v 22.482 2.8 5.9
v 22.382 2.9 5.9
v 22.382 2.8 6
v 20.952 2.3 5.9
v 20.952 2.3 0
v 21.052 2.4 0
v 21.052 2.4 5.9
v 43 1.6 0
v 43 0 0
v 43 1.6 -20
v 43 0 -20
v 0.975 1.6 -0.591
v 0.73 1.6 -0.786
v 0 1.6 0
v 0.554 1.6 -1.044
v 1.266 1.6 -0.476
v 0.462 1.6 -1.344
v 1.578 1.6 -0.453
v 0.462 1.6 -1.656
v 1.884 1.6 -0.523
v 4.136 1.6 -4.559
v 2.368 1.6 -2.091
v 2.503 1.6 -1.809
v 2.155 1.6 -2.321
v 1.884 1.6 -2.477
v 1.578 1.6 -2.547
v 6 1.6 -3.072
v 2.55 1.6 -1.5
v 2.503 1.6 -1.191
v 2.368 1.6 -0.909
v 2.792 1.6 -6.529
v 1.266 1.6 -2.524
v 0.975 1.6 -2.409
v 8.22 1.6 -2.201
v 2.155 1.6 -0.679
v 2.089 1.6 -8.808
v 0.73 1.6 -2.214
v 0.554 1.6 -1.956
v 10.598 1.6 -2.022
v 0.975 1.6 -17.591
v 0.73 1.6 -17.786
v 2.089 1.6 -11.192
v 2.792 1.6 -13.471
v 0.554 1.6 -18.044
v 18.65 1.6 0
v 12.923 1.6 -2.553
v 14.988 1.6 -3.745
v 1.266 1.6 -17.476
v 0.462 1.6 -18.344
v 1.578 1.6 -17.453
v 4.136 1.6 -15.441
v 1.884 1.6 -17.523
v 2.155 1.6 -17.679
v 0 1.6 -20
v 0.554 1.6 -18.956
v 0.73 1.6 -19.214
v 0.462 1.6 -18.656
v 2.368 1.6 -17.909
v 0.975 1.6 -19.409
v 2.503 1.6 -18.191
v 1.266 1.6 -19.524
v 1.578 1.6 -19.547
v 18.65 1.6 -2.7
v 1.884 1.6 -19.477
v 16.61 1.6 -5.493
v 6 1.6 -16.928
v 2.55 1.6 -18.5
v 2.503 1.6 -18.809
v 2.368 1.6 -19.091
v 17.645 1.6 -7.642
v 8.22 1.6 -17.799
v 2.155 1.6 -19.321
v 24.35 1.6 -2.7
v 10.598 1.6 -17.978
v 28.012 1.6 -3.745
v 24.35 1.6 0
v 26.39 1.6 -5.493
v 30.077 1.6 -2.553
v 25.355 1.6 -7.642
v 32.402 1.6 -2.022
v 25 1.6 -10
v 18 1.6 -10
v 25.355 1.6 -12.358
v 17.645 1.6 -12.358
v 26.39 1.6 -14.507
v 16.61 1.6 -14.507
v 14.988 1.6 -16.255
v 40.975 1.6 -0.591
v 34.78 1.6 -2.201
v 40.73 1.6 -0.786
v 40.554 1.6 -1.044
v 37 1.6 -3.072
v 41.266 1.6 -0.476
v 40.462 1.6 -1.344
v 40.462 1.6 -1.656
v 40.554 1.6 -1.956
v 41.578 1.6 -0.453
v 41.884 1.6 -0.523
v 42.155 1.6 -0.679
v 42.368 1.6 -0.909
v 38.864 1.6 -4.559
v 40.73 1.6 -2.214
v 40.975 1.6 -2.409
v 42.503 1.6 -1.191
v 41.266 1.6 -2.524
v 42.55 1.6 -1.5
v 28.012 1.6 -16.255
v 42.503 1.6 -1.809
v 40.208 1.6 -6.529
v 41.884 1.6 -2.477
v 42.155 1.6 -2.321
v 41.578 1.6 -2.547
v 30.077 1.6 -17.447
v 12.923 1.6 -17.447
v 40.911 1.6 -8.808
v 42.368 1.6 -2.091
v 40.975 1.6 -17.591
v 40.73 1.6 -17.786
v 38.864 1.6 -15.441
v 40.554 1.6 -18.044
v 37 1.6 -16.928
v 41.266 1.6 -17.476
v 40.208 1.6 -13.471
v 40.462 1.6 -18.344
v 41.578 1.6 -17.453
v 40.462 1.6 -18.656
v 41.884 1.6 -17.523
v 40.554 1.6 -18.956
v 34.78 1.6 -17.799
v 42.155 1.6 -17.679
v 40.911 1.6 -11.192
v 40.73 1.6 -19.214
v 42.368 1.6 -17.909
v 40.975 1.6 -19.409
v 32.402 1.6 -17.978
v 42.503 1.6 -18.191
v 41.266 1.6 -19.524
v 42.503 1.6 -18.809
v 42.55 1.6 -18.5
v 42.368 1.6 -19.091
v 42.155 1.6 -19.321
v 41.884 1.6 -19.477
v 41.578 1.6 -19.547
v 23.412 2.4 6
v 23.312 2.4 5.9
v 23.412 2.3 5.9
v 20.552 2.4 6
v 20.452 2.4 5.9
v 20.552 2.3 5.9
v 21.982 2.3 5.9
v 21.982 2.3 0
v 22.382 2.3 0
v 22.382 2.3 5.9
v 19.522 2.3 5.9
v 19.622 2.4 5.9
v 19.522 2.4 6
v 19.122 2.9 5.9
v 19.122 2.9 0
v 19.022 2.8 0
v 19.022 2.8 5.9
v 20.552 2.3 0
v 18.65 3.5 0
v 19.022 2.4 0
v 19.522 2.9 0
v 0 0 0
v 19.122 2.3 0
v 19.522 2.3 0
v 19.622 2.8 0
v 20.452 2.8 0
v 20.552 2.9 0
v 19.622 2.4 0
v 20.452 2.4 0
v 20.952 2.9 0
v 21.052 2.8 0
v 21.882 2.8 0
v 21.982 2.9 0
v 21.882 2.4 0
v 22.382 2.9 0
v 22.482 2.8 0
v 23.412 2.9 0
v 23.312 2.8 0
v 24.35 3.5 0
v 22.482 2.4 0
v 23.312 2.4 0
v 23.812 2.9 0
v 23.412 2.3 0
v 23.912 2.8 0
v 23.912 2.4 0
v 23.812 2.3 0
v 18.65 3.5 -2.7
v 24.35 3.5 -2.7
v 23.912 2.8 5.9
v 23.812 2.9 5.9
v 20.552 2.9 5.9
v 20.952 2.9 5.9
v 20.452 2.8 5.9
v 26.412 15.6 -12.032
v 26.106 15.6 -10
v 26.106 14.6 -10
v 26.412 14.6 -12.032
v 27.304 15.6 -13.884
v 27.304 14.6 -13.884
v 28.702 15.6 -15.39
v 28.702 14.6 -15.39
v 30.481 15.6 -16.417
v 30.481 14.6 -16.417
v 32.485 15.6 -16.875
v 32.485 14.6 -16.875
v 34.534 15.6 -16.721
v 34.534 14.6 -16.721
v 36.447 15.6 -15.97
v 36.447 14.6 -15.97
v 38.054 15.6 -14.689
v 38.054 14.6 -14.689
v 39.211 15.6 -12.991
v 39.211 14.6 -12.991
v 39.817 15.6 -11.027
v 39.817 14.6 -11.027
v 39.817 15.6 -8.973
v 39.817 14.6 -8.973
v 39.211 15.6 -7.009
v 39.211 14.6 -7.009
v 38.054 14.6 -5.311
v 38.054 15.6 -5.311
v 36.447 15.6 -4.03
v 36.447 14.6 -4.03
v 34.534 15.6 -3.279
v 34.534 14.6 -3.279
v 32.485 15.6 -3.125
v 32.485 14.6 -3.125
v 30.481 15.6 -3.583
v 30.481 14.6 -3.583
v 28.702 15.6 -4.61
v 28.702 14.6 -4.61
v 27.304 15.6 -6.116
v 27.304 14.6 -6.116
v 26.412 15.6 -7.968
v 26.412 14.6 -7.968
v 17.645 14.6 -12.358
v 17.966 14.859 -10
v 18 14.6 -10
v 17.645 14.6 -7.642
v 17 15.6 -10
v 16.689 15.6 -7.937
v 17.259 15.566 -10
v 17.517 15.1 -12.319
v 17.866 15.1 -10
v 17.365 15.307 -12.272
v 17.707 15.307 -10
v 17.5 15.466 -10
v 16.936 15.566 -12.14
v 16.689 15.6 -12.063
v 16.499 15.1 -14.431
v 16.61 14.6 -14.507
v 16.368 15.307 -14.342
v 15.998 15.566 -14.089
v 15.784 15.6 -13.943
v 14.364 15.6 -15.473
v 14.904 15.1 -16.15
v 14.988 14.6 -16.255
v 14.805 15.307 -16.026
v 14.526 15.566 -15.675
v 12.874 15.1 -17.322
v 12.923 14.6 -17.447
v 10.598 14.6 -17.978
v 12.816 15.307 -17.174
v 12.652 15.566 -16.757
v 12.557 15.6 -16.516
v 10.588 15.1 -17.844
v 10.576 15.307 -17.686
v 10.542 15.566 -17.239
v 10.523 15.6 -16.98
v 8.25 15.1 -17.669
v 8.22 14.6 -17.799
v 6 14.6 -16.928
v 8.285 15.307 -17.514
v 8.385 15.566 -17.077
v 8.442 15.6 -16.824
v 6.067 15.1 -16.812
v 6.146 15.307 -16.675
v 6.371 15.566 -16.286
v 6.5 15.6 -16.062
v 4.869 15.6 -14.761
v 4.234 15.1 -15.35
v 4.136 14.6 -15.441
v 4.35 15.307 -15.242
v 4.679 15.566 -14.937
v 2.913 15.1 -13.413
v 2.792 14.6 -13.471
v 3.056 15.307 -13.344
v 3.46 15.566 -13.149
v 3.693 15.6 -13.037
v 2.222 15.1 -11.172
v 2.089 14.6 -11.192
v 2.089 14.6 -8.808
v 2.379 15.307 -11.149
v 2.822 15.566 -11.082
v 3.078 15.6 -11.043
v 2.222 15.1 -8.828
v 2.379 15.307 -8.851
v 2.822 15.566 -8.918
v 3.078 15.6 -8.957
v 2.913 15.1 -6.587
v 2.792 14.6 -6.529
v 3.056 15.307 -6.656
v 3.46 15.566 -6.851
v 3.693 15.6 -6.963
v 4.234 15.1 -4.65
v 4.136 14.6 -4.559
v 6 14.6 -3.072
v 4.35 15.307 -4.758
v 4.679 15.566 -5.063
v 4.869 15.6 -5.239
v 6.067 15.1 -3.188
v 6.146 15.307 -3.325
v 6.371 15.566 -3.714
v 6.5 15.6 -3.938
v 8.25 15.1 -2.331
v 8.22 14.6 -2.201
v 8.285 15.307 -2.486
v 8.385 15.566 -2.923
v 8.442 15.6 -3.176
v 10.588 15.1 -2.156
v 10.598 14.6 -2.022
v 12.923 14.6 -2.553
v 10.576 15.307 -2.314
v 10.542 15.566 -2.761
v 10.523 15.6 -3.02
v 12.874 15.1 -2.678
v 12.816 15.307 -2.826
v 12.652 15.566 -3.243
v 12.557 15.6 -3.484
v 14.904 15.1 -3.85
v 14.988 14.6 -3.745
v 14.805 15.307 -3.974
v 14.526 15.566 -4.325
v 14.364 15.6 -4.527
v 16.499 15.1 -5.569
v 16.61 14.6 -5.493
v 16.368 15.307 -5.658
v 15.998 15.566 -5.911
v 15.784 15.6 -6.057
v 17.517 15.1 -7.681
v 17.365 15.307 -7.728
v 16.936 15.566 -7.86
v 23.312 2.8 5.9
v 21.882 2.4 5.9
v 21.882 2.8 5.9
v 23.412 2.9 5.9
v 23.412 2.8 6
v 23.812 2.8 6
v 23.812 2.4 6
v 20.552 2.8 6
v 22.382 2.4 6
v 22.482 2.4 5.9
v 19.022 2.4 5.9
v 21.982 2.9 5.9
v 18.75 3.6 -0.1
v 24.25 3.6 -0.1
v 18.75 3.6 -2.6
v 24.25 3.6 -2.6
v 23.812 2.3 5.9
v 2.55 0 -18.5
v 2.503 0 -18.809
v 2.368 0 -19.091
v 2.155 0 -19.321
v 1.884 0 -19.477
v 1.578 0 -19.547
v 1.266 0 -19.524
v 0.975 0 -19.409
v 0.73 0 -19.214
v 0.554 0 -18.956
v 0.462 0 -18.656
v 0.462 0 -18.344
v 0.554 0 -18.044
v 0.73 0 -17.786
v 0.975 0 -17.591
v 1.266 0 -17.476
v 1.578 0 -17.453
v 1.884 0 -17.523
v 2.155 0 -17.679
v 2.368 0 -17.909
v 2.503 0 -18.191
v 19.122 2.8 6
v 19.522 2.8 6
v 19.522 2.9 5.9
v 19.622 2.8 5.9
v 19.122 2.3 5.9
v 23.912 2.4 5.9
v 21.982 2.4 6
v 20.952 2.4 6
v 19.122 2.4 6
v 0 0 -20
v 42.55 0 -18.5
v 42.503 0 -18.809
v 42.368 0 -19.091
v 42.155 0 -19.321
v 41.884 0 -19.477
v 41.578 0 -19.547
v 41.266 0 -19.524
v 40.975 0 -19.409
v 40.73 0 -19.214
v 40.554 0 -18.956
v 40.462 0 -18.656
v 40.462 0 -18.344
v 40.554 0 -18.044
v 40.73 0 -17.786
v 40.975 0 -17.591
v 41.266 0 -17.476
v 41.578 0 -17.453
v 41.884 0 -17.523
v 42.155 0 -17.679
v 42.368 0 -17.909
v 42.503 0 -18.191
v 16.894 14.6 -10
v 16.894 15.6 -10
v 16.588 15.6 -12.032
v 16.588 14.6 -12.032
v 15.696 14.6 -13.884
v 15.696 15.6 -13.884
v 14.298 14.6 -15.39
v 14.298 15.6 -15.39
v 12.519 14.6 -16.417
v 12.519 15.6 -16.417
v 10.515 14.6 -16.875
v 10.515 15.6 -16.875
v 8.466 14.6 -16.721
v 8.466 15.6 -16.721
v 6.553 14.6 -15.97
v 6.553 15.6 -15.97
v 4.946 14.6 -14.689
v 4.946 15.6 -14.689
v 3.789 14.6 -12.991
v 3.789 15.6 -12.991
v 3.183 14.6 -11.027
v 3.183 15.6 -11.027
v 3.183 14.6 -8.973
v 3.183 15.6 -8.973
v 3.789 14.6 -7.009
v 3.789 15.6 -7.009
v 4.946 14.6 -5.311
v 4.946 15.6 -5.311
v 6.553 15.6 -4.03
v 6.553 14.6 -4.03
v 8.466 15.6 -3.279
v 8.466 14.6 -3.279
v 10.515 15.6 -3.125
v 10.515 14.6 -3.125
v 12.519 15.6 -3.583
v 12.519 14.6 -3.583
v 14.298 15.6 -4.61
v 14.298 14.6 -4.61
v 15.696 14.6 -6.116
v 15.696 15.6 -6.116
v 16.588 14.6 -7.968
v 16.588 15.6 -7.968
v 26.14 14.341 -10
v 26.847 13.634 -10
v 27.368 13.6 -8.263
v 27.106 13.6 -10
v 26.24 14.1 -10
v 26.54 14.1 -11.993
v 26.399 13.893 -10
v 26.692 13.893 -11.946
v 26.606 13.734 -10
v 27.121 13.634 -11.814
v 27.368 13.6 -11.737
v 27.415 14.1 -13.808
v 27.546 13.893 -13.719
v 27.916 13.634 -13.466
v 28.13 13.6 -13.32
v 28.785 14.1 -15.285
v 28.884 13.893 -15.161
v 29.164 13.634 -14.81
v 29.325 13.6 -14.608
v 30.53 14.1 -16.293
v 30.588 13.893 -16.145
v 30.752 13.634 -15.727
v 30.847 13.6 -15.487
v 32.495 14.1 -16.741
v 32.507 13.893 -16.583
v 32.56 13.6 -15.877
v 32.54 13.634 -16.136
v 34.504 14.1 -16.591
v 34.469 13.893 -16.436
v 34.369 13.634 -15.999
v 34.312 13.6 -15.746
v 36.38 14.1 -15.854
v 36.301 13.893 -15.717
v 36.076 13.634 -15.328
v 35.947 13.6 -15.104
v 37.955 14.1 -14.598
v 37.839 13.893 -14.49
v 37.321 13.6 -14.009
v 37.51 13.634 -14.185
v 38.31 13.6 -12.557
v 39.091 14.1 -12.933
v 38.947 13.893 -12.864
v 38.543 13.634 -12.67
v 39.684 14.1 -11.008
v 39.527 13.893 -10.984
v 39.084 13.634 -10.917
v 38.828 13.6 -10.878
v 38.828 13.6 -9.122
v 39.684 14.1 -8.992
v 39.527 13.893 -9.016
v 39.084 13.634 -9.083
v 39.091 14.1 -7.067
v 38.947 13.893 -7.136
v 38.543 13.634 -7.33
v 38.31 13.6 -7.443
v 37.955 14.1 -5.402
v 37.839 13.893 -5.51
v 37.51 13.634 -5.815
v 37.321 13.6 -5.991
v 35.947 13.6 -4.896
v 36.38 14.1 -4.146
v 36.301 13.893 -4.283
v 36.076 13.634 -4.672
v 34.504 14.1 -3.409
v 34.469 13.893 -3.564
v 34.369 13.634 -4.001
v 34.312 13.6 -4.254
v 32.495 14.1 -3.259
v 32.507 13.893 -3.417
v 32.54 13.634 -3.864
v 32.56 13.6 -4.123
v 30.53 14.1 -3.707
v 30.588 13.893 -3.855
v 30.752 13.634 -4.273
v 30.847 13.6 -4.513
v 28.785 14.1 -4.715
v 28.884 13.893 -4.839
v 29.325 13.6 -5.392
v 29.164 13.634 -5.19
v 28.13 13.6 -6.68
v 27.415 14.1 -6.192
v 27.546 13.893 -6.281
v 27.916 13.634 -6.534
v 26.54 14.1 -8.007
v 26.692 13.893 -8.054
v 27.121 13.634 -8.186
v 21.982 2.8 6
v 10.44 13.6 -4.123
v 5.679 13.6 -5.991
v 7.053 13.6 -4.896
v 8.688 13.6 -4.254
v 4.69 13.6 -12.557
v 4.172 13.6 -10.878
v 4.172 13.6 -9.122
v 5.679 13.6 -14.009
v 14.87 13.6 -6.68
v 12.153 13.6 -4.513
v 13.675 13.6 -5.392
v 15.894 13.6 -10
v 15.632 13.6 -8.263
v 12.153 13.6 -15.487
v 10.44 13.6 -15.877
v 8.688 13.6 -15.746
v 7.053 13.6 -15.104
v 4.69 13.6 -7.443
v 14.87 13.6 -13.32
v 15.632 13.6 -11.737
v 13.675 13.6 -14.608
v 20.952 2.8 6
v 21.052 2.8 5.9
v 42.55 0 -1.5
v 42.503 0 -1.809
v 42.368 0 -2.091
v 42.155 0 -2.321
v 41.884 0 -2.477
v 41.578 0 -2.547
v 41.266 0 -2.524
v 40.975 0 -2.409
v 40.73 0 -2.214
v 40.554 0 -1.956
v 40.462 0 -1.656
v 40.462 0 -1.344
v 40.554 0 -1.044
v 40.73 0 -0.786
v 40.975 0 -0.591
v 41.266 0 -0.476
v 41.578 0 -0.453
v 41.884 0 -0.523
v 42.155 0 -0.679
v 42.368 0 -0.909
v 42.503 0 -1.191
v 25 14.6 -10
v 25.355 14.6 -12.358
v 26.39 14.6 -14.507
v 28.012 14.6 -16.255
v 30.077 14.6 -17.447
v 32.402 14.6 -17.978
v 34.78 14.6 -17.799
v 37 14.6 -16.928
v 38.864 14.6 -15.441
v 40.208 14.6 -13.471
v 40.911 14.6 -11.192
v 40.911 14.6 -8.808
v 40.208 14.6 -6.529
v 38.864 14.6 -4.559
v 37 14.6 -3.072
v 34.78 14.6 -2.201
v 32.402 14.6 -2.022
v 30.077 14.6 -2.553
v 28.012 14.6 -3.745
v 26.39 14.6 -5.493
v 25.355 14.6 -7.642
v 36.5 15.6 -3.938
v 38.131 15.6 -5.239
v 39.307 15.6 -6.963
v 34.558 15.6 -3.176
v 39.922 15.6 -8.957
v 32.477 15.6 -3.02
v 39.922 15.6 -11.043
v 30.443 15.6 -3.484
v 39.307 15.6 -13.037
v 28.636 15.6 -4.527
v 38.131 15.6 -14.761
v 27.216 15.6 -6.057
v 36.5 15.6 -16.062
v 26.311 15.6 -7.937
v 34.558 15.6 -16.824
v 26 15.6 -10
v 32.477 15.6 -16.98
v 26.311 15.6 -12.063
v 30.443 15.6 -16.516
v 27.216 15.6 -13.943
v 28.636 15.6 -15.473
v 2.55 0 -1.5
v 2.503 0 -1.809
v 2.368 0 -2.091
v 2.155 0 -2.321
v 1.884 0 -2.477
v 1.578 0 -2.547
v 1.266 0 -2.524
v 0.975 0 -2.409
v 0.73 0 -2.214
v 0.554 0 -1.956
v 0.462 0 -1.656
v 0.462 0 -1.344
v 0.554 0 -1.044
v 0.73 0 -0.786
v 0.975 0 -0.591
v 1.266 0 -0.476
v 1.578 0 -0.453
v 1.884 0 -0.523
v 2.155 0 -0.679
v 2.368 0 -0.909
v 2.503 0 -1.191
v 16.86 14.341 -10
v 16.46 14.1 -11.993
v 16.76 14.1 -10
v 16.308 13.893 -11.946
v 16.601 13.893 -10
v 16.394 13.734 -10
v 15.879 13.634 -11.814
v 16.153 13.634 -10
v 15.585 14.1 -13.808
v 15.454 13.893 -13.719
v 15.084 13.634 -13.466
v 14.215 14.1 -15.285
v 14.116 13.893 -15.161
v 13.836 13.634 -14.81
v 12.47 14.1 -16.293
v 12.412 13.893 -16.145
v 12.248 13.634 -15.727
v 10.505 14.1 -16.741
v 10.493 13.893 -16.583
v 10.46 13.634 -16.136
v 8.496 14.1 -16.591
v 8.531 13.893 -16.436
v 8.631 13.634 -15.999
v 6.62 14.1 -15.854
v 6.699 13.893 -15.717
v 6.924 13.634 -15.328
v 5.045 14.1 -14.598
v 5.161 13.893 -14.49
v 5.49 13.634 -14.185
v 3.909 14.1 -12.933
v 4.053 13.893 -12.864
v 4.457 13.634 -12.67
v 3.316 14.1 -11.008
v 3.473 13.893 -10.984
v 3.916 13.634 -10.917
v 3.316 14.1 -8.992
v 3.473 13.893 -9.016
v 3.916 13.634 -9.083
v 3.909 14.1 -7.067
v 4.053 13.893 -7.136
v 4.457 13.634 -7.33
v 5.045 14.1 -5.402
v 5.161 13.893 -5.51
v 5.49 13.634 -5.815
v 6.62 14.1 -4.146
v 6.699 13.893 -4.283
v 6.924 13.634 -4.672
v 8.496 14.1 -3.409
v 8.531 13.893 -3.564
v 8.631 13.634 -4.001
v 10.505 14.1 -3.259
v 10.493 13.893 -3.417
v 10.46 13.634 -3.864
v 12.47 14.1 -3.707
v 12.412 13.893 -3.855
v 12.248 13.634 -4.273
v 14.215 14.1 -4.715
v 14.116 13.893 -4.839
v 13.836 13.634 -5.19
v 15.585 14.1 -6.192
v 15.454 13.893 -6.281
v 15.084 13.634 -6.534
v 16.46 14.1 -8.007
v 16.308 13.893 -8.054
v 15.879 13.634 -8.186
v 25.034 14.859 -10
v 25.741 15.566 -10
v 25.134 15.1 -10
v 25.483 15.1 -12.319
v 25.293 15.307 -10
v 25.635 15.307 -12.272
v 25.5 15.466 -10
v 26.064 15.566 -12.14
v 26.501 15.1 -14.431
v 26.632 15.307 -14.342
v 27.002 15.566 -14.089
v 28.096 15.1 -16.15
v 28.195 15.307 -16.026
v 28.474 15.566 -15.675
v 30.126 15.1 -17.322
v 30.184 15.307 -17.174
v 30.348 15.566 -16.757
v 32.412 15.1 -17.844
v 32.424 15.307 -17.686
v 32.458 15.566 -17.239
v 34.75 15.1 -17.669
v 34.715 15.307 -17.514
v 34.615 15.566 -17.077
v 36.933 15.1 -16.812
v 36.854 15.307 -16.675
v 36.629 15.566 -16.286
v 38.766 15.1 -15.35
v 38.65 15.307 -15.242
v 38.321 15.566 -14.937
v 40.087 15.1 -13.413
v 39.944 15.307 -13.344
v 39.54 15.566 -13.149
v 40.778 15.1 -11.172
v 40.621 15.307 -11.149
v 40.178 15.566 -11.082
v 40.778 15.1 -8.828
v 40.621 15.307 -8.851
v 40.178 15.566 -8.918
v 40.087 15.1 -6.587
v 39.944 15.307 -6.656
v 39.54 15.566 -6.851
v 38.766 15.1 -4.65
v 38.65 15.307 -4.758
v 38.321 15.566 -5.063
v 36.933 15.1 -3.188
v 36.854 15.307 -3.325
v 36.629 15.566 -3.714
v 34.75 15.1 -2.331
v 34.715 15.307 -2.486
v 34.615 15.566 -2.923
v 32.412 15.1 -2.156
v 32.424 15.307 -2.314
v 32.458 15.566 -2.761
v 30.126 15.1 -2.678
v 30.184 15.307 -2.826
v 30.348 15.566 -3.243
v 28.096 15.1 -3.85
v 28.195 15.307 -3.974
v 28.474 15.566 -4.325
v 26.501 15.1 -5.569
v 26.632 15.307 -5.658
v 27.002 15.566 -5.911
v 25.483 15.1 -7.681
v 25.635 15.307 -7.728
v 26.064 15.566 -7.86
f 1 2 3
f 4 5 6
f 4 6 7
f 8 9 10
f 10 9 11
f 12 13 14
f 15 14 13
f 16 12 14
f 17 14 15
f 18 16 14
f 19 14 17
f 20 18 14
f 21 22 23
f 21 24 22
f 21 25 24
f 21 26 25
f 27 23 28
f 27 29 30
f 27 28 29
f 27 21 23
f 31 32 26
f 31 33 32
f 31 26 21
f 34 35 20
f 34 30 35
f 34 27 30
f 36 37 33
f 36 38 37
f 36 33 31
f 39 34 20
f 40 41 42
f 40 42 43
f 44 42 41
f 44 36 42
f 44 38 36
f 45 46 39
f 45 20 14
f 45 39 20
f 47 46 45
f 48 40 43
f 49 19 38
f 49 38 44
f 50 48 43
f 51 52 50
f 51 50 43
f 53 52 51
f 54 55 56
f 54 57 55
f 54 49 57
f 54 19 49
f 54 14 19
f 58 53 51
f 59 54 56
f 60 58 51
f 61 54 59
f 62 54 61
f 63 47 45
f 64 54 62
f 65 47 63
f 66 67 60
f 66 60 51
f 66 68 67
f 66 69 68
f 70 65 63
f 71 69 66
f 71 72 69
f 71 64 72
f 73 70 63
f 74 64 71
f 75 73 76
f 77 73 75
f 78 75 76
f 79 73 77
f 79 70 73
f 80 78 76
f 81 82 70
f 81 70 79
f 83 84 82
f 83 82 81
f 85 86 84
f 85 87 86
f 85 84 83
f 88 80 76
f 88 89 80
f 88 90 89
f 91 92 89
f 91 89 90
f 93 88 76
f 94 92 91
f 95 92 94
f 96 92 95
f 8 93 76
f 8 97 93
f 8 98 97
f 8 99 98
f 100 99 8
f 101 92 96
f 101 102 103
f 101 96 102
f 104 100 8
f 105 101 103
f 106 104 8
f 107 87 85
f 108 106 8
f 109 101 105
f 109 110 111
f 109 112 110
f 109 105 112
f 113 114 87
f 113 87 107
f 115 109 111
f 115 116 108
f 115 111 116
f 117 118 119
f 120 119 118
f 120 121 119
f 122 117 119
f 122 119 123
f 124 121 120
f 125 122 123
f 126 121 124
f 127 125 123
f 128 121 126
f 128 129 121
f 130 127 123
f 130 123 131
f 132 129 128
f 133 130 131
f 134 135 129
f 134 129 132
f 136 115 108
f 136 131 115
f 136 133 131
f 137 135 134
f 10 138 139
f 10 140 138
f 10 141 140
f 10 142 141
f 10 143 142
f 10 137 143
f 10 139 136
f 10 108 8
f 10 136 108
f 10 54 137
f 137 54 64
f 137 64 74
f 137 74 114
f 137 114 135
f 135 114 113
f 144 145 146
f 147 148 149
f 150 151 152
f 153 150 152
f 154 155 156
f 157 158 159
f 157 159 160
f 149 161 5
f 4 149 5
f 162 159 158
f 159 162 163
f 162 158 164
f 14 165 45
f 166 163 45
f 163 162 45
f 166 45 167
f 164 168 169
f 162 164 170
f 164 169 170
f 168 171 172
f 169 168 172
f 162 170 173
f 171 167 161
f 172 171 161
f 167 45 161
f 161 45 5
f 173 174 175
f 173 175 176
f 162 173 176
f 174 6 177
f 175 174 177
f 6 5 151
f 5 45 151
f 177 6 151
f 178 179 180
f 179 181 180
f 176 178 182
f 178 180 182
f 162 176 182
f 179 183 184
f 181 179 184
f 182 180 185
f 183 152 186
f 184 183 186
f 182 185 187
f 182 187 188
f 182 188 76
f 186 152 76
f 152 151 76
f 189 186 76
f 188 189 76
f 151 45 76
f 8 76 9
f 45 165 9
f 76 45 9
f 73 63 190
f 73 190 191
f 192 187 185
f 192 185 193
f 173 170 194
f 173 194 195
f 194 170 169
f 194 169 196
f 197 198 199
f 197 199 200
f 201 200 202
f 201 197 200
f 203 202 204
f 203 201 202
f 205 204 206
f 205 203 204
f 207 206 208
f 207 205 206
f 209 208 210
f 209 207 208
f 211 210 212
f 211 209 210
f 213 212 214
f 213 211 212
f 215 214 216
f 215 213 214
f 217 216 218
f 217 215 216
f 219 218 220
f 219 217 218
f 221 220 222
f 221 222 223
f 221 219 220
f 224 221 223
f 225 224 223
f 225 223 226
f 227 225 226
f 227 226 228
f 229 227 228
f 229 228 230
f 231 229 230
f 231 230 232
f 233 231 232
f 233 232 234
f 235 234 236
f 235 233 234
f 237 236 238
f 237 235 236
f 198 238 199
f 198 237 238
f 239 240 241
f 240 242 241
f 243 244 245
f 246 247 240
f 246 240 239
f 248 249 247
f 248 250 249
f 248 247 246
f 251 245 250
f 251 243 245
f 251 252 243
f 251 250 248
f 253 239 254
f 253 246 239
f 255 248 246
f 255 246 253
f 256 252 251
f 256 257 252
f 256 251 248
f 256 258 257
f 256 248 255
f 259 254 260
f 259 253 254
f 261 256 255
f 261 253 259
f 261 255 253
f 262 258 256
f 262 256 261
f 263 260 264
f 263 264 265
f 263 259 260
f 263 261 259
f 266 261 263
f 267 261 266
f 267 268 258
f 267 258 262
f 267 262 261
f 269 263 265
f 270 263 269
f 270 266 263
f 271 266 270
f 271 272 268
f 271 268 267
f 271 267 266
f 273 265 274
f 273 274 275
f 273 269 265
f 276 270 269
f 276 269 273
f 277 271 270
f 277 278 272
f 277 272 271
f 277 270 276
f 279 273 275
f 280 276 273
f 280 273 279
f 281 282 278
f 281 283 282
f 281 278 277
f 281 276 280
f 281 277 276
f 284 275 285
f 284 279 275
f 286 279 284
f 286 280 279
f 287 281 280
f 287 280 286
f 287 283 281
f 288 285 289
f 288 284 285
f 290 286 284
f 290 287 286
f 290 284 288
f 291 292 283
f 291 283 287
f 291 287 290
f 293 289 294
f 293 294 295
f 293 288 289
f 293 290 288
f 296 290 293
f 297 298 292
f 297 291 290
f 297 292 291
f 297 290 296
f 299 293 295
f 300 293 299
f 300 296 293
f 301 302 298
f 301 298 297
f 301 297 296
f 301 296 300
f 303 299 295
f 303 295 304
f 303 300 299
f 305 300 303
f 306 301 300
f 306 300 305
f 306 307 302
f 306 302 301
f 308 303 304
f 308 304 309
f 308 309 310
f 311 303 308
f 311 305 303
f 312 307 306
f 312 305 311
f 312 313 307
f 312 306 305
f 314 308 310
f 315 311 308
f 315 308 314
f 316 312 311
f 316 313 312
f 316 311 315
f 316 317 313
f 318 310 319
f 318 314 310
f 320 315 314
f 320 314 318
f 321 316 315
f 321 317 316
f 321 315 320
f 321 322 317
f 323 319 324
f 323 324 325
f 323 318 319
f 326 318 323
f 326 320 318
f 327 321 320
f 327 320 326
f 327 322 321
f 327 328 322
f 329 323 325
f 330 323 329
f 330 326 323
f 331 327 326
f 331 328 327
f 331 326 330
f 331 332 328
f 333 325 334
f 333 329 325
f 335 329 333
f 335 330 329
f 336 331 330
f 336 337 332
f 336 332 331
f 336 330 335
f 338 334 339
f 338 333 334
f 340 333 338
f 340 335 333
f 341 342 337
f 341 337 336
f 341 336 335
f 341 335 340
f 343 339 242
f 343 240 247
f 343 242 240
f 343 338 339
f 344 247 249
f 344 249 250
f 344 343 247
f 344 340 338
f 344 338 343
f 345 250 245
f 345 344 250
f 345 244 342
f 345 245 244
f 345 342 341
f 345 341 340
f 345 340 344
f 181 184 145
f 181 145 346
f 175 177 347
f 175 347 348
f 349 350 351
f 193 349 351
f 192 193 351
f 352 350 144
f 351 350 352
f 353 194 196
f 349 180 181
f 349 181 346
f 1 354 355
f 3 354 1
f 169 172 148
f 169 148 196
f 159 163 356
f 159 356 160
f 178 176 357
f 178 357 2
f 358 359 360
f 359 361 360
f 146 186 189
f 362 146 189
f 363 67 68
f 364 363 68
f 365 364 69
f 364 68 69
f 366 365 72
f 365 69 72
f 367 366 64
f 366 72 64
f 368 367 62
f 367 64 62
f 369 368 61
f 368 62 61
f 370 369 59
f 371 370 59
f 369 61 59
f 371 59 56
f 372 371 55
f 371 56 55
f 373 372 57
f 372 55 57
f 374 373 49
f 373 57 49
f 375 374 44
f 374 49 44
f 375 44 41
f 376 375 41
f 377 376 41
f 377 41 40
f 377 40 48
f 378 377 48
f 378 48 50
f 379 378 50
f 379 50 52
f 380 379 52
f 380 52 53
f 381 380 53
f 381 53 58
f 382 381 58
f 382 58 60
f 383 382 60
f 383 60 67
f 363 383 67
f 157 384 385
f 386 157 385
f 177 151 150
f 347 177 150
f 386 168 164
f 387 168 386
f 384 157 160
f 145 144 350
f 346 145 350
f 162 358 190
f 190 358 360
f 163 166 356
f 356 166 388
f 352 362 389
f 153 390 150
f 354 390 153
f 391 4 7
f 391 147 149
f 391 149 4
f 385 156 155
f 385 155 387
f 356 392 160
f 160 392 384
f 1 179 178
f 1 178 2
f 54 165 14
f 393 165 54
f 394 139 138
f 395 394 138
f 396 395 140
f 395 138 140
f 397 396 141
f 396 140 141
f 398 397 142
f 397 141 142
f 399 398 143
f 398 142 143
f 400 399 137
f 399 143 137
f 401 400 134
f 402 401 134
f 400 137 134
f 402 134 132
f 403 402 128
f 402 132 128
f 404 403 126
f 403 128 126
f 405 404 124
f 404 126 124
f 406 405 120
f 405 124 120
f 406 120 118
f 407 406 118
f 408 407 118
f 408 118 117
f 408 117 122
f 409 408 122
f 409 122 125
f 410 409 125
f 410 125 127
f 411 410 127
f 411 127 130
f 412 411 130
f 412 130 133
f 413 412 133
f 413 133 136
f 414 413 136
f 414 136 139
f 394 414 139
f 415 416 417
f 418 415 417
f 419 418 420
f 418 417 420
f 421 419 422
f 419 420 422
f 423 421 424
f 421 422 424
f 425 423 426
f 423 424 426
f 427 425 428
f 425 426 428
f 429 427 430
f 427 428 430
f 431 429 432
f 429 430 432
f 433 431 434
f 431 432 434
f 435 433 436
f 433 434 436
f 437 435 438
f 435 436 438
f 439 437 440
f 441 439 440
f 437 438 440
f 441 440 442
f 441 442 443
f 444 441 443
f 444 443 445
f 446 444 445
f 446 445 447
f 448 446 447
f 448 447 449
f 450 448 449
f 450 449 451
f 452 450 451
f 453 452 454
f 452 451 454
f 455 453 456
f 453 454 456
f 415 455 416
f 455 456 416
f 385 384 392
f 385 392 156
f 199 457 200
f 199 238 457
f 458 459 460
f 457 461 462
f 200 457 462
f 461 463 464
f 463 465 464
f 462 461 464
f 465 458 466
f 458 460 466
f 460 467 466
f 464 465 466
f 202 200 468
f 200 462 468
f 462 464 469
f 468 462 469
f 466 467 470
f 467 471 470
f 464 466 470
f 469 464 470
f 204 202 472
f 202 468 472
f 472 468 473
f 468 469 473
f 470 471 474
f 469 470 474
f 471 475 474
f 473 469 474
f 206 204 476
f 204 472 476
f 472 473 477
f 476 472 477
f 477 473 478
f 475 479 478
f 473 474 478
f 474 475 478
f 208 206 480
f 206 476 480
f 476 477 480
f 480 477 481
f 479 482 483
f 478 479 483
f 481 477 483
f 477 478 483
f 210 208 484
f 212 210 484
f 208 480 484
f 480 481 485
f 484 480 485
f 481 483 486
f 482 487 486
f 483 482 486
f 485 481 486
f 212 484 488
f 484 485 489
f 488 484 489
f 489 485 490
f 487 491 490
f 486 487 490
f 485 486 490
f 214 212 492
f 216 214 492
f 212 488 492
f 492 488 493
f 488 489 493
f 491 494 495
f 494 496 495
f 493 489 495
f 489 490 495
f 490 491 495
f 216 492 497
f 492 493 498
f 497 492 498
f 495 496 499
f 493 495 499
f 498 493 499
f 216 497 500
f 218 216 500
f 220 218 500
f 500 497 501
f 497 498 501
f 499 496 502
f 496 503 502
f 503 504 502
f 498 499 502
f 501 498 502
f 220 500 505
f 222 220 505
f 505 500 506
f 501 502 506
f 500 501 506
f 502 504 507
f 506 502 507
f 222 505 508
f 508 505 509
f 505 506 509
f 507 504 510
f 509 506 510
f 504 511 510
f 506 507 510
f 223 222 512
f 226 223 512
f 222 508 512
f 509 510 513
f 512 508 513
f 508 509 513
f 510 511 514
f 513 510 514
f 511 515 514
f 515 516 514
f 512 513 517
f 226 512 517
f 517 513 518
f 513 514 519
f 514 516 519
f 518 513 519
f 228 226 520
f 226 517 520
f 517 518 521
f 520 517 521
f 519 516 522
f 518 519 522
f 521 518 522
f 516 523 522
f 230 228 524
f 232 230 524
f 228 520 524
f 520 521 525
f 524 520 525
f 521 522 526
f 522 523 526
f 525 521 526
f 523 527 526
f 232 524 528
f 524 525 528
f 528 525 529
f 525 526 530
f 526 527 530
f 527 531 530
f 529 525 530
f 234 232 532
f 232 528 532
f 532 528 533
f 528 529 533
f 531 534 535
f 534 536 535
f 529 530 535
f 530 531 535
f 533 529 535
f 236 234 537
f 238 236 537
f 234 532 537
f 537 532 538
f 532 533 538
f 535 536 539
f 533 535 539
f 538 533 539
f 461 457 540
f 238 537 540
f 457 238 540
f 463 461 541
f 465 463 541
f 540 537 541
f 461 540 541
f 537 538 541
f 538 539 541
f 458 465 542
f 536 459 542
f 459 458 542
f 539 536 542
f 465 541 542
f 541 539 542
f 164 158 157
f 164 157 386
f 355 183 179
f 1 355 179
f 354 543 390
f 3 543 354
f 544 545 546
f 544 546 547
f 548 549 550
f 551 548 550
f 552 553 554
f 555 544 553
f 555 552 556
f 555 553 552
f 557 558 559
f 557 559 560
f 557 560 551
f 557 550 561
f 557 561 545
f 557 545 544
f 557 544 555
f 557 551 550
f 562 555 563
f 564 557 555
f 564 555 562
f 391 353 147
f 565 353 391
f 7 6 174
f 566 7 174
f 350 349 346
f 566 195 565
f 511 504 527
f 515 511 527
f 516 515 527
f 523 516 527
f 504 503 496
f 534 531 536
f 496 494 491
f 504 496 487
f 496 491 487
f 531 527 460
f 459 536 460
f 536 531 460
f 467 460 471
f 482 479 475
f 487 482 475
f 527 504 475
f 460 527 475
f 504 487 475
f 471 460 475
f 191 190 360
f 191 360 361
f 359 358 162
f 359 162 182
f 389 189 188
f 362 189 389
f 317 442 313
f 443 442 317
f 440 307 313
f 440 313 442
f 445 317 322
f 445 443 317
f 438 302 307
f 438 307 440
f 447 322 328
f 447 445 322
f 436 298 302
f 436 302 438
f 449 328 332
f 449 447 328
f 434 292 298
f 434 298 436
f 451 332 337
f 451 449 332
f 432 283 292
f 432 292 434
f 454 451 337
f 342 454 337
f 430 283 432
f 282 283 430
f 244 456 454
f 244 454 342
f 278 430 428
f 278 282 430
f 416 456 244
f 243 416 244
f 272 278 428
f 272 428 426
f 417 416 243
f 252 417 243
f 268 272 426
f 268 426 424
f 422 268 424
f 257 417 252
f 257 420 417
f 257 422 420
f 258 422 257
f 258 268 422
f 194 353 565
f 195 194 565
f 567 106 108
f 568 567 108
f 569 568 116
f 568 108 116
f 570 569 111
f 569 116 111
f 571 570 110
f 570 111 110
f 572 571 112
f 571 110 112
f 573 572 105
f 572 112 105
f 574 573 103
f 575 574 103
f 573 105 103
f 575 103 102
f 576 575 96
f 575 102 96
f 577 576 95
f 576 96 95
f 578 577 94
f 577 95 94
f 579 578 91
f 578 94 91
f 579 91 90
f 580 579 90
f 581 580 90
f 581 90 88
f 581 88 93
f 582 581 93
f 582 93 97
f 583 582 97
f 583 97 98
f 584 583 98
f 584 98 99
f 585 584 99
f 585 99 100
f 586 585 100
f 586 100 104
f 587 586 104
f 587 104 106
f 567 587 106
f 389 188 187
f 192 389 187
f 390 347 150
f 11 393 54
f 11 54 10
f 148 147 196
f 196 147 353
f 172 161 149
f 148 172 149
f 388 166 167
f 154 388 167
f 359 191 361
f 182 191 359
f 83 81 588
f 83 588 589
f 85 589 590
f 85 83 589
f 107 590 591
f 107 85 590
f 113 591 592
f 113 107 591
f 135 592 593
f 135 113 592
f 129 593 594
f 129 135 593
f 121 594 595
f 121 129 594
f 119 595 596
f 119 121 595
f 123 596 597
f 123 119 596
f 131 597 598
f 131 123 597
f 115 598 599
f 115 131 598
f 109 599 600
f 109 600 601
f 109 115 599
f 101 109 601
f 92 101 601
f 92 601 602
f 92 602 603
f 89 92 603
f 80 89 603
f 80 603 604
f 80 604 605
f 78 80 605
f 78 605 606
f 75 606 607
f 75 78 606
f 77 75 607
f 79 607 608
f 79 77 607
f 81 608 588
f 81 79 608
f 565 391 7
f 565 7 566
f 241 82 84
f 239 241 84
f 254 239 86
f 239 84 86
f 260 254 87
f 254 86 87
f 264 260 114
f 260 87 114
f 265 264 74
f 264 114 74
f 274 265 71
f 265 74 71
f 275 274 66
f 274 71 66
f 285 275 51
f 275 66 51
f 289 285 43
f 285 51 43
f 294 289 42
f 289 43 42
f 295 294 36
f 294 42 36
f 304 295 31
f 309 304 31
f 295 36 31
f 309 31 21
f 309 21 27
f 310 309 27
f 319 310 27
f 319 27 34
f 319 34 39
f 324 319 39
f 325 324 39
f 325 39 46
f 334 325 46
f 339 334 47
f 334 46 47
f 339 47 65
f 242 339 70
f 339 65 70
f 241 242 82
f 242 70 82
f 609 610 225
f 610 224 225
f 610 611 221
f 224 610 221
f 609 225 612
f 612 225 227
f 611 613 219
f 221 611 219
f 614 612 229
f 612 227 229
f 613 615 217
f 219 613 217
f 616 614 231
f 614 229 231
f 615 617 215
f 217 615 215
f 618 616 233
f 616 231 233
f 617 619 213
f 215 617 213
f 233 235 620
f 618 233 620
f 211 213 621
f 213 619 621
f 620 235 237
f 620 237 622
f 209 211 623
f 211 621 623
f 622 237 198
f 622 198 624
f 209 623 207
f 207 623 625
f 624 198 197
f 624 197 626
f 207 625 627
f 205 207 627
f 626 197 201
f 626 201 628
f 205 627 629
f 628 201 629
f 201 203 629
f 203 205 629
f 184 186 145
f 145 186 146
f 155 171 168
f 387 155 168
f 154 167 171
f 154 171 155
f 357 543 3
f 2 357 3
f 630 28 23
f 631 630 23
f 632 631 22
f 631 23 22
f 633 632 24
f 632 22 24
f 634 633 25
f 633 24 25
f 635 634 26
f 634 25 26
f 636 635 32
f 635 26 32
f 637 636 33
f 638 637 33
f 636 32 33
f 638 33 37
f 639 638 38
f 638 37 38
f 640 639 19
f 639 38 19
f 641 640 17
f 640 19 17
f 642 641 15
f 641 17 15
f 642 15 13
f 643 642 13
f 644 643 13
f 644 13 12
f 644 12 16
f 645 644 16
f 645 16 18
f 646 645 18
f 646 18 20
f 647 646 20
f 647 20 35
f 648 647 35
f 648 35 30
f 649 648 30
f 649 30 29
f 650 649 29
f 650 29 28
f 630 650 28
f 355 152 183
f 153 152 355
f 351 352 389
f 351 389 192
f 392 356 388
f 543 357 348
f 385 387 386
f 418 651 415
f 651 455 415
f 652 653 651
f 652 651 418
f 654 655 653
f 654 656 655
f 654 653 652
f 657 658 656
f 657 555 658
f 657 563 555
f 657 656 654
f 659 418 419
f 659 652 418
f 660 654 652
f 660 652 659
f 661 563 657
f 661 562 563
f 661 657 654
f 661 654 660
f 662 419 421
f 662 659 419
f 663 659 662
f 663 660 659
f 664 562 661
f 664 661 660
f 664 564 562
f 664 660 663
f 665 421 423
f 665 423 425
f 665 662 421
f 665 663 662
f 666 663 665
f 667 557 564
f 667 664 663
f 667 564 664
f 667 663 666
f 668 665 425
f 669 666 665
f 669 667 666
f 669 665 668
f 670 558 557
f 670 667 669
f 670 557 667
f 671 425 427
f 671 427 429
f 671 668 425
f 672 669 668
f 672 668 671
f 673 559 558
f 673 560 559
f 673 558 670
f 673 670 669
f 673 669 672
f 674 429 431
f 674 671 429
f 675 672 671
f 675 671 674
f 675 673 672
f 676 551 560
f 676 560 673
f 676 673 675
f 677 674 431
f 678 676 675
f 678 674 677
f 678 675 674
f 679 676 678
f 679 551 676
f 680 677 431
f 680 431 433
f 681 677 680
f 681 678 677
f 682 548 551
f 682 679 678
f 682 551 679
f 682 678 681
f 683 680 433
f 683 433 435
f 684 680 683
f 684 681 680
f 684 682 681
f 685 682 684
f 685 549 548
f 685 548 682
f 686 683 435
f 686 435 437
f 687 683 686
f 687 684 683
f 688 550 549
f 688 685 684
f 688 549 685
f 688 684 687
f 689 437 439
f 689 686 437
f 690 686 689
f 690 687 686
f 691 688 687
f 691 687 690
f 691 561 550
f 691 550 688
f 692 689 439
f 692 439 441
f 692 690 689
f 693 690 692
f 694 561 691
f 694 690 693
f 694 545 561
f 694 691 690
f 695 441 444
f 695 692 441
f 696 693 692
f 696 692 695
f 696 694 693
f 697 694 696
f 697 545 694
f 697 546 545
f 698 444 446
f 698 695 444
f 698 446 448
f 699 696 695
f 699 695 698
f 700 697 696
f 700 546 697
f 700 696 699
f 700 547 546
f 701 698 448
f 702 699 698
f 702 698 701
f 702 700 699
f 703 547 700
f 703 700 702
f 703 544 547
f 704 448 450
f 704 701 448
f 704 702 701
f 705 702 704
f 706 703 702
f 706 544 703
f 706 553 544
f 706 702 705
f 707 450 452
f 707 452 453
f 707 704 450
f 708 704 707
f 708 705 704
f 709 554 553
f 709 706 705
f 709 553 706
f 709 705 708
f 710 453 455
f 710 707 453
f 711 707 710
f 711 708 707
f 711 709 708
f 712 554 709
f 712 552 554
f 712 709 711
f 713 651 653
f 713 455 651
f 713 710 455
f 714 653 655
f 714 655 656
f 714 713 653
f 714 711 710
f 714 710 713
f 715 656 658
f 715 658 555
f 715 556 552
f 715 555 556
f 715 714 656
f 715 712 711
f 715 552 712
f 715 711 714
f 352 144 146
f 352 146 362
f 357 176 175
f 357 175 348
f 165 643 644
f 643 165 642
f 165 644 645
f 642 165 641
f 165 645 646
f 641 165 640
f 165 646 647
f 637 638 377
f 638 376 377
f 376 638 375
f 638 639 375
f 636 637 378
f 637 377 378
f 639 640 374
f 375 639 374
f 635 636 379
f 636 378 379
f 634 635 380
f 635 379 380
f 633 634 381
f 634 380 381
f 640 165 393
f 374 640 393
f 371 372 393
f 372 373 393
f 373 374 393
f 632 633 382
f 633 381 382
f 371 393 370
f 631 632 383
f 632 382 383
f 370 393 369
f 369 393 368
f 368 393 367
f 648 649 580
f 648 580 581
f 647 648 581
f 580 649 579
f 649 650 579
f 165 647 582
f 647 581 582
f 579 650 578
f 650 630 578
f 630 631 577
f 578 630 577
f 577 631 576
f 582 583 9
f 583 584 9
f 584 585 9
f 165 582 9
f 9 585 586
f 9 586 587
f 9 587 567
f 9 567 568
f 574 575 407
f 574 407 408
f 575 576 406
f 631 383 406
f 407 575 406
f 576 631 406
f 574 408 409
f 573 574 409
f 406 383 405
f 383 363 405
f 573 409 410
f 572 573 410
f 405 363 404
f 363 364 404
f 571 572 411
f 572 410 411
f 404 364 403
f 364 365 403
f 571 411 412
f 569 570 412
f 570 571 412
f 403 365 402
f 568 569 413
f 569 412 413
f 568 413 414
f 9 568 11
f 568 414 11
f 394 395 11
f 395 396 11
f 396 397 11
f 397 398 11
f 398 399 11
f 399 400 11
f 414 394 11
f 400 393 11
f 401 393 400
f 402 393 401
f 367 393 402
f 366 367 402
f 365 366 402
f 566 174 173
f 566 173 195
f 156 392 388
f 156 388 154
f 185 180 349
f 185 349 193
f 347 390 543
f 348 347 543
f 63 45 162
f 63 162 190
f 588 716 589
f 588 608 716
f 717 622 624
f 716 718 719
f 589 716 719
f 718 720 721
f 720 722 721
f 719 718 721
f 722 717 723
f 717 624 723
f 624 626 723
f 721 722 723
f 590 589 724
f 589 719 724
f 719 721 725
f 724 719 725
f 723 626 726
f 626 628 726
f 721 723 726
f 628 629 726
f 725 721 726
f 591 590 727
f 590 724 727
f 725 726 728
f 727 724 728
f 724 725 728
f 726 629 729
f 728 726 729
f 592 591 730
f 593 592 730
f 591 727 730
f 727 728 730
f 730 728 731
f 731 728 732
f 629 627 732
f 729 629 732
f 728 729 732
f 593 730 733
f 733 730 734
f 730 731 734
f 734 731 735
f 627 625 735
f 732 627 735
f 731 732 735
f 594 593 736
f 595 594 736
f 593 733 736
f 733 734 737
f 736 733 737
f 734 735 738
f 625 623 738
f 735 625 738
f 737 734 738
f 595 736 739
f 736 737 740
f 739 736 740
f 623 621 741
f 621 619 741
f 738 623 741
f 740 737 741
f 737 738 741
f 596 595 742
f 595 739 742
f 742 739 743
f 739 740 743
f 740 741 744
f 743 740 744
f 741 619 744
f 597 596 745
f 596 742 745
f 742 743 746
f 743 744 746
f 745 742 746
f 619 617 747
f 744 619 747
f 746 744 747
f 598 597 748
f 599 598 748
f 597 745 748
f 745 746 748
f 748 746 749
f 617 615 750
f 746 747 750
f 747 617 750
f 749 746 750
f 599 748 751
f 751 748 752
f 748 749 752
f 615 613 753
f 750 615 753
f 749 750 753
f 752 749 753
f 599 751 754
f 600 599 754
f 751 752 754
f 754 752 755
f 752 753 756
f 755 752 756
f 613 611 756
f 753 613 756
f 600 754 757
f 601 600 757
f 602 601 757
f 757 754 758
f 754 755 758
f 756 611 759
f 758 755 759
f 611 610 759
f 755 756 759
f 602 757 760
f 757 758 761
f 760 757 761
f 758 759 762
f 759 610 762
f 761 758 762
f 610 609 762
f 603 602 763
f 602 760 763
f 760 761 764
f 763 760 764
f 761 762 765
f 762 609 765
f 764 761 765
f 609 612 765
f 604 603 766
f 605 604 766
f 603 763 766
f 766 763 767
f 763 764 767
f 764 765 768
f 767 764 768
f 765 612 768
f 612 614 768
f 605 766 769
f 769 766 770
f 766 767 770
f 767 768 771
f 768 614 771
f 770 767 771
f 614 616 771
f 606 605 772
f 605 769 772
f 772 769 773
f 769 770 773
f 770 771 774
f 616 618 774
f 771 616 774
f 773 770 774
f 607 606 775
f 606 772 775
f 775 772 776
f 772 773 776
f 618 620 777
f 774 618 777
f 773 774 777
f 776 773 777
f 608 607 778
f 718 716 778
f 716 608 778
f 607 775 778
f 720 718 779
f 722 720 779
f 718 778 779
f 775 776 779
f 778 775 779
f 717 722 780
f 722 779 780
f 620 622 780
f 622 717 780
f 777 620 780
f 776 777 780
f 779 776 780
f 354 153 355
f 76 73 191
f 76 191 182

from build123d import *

# Parameters (mm, degrees)
SKETCH1_W            = 43
SKETCH1_H            = 20
BOSS_EXTRUDE1_DEPTH  = 1.6
SKETCH2_R            = 8
BOSS_EXTRUDE2_DEPTH  = 14
SKETCH3_R            = 6.893962295
CUT_EXTRUDE1_DEPTH   = 2
FILLET1_R            = 1
FILLET2_R            = 1
FILLET1_OF_MIRROR1_R = 1
FILLET2_OF_MIRROR1_R = 1
BOSS_EXTRUDE3_DEPTH  = 2
SKETCH5_W            = 0.6
SKETCH5_H            = 0.6
BOSS_EXTRUDE4_DEPTH  = 6
CHAMFER1_SIZE        = 0.1
CHAMFER2_SIZE        = 0.1
CUT_EXTRUDE2_REACH   = 51.447
SKETCH6_R            = 1.05


with BuildPart() as part:
    # Sketch1 → Boss-Extrude1 (new body)
    with BuildSketch(Plane(origin=(0, 0, 0), x_dir=(1, 0, 0), z_dir=(0, 1, 0))):
        with Locations((21.5, 10)):
            Rectangle(SKETCH1_W, SKETCH1_H)
    extrude(amount=BOSS_EXTRUDE1_DEPTH)

    # Sketch2 → Boss-Extrude2 (add)
    with BuildSketch(Plane(origin=(0, 1.6, 0), x_dir=(1, 0, 0), z_dir=(0, 1, 0))):
        with Locations((10, 10)):
            Circle(SKETCH2_R)
    boss_extrude2 = extrude(amount=BOSS_EXTRUDE2_DEPTH)

    # Sketch3 → Cut-Extrude1 (cut)
    with BuildSketch(Plane(origin=(0, 15.6, 0), x_dir=(1, 0, 0), z_dir=(0, 1, 0))):
        with Locations((10, 10)):
            Circle(SKETCH3_R)
    cut_extrude1 = extrude(amount=-CUT_EXTRUDE1_DEPTH, mode=Mode.SUBTRACT)

    # Fillet1
    fillet1_edges = [part.edges().sort_by_distance(p)[0] for p in [
        (2, 15.6, -10),
    ]]
    fillet(fillet1_edges, radius=FILLET1_R)

    # Fillet2
    fillet2_edges = [part.edges().sort_by_distance(p)[0] for p in [
        (3.106037705, 13.6, -10),
    ]]
    fillet(fillet2_edges, radius=FILLET2_R)

    # Mirror1: Boss-Extrude2, Cut-Extrude1 across plane
    add(boss_extrude2.mirror(Plane(origin=(21.5, 0, 0), x_dir=(0, 0, 1), z_dir=(1, 0, 0))))
    add(cut_extrude1.mirror(Plane(origin=(21.5, 0, 0), x_dir=(0, 0, 1), z_dir=(1, 0, 0))), mode=Mode.SUBTRACT)

    # Fillet1 of Mirror1
    fillet1_of_mirror1_edges = [part.edges().sort_by_distance(p)[0] for p in [
        (41, 15.6, -10),
    ]]
    fillet(fillet1_of_mirror1_edges, radius=FILLET1_OF_MIRROR1_R)

    # Fillet2 of Mirror1
    fillet2_of_mirror1_edges = [part.edges().sort_by_distance(p)[0] for p in [
        (39.893962295, 13.6, -10),
    ]]
    fillet(fillet2_of_mirror1_edges, radius=FILLET2_OF_MIRROR1_R)

    # Sketch4 → Boss-Extrude3 (add)
    with BuildSketch(Plane(origin=(0, 1.6, 0), x_dir=(1, 0, 0), z_dir=(0, 1, 0))):
        Polygon((21.5, 0), (18.65, 0), (18.65, 2.7), (24.35, 2.7), (24.35, 0), align=None)
    extrude(amount=BOSS_EXTRUDE3_DEPTH)

    # Sketch5 → Boss-Extrude4 (add)
    with BuildSketch(Plane.XY):
        with Locations((19.322458837, 2.6)):
            Rectangle(SKETCH5_W, SKETCH5_H)
        with Locations((20.752458837, 2.6)):
            Rectangle(SKETCH5_W, SKETCH5_H)
        with Locations((22.182458837, 2.6)):
            Rectangle(SKETCH5_W, SKETCH5_H)
        with Locations((23.612458837, 2.6)):
            Rectangle(SKETCH5_W, SKETCH5_H)
    extrude(amount=BOSS_EXTRUDE4_DEPTH)

    # Chamfer1
    chamfer1_edges = [part.edges().sort_by_distance(p)[0] for p in [
        (23.912458837, 2.6, 6),
        (23.912458837, 2.3, 3),
        (23.612458837, 2.3, 6),
        (23.312458837, 2.3, 3),
        (23.312458837, 2.6, 6),
        (23.912458837, 2.9, 3),
        (23.612458837, 2.9, 6),
        (23.312458837, 2.9, 3),
        (22.482458837, 2.6, 6),
        (22.482458837, 2.3, 3),
        (22.182458837, 2.3, 6),
        (21.882458837, 2.3, 3),
        (21.882458837, 2.6, 6),
        (21.882458837, 2.9, 3),
        (22.182458837, 2.9, 6),
        (22.482458837, 2.9, 3),
        (21.052458837, 2.6, 6),
        (21.052458837, 2.3, 3),
        (20.752458837, 2.3, 6),
        (20.452458837, 2.3, 3),
        (20.452458837, 2.6, 6),
        (21.052458837, 2.9, 3),
        (20.752458837, 2.9, 6),
        (20.452458837, 2.9, 3),
        (19.322458837, 2.3, 6),
        (19.022458837, 2.3, 3),
        (19.022458837, 2.6, 6),
        (19.022458837, 2.9, 3),
        (19.322458837, 2.9, 6),
        (19.622458837, 2.3, 3),
        (19.622458837, 2.6, 6),
        (19.622458837, 2.9, 3),
    ]]
    chamfer(chamfer1_edges, length=CHAMFER1_SIZE)

    # Chamfer2
    chamfer2_edges = [part.edges().sort_by_distance(p)[0] for p in [
        (18.65, 3.6, -1.35),
        (21.5, 3.6, -2.7),
        (24.35, 3.6, -1.35),
        (21.5, 3.6, 0),
    ]]
    chamfer(chamfer2_edges, length=CHAMFER2_SIZE)

    # Sketch6 → Cut-Extrude2 (cut, up to next)
    with BuildSketch(Plane(origin=(0, 1.6, 0), x_dir=(1, 0, 0), z_dir=(0, 1, 0)), mode=Mode.PRIVATE) as cut_extrude2_sk1:
        with Locations((1.5, 18.5)):
            Circle(SKETCH6_R)
    cut_extrude2_tool1 = extrude(cut_extrude2_sk1.sketch, amount=-CUT_EXTRUDE2_REACH, mode=Mode.PRIVATE) & part.part
    # Sketch6 → Cut-Extrude2 (cut, up to next)
    with BuildSketch(Plane(origin=(0, 1.6, 0), x_dir=(1, 0, 0), z_dir=(0, 1, 0)), mode=Mode.PRIVATE) as cut_extrude2_sk2:
        with Locations((1.5, 1.5)):
            Circle(SKETCH6_R)
    cut_extrude2_tool2 = extrude(cut_extrude2_sk2.sketch, amount=-CUT_EXTRUDE2_REACH, mode=Mode.PRIVATE) & part.part
    # Sketch6 → Cut-Extrude2 (cut, up to next)
    with BuildSketch(Plane(origin=(0, 1.6, 0), x_dir=(1, 0, 0), z_dir=(0, 1, 0)), mode=Mode.PRIVATE) as cut_extrude2_sk3:
        with Locations((41.5, 1.5)):
            Circle(SKETCH6_R)
    cut_extrude2_tool3 = extrude(cut_extrude2_sk3.sketch, amount=-CUT_EXTRUDE2_REACH, mode=Mode.PRIVATE) & part.part
    # Sketch6 → Cut-Extrude2 (cut, up to next)
    with BuildSketch(Plane(origin=(0, 1.6, 0), x_dir=(1, 0, 0), z_dir=(0, 1, 0)), mode=Mode.PRIVATE) as cut_extrude2_sk4:
        with Locations((41.5, 18.5)):
            Circle(SKETCH6_R)
    cut_extrude2_tool4 = extrude(cut_extrude2_sk4.sketch, amount=-CUT_EXTRUDE2_REACH, mode=Mode.PRIVATE) & part.part
    add(cut_extrude2_tool1.solids().sort_by_distance((1.5, 1.6, -18.5))[0], mode=Mode.SUBTRACT)
    add(cut_extrude2_tool2.solids().sort_by_distance((1.5, 1.6, -1.5))[0], mode=Mode.SUBTRACT)
    add(cut_extrude2_tool3.solids().sort_by_distance((41.5, 1.6, -1.5))[0], mode=Mode.SUBTRACT)
    add(cut_extrude2_tool4.solids().sort_by_distance((41.5, 1.6, -18.5))[0], mode=Mode.SUBTRACT)


solid = part.part
